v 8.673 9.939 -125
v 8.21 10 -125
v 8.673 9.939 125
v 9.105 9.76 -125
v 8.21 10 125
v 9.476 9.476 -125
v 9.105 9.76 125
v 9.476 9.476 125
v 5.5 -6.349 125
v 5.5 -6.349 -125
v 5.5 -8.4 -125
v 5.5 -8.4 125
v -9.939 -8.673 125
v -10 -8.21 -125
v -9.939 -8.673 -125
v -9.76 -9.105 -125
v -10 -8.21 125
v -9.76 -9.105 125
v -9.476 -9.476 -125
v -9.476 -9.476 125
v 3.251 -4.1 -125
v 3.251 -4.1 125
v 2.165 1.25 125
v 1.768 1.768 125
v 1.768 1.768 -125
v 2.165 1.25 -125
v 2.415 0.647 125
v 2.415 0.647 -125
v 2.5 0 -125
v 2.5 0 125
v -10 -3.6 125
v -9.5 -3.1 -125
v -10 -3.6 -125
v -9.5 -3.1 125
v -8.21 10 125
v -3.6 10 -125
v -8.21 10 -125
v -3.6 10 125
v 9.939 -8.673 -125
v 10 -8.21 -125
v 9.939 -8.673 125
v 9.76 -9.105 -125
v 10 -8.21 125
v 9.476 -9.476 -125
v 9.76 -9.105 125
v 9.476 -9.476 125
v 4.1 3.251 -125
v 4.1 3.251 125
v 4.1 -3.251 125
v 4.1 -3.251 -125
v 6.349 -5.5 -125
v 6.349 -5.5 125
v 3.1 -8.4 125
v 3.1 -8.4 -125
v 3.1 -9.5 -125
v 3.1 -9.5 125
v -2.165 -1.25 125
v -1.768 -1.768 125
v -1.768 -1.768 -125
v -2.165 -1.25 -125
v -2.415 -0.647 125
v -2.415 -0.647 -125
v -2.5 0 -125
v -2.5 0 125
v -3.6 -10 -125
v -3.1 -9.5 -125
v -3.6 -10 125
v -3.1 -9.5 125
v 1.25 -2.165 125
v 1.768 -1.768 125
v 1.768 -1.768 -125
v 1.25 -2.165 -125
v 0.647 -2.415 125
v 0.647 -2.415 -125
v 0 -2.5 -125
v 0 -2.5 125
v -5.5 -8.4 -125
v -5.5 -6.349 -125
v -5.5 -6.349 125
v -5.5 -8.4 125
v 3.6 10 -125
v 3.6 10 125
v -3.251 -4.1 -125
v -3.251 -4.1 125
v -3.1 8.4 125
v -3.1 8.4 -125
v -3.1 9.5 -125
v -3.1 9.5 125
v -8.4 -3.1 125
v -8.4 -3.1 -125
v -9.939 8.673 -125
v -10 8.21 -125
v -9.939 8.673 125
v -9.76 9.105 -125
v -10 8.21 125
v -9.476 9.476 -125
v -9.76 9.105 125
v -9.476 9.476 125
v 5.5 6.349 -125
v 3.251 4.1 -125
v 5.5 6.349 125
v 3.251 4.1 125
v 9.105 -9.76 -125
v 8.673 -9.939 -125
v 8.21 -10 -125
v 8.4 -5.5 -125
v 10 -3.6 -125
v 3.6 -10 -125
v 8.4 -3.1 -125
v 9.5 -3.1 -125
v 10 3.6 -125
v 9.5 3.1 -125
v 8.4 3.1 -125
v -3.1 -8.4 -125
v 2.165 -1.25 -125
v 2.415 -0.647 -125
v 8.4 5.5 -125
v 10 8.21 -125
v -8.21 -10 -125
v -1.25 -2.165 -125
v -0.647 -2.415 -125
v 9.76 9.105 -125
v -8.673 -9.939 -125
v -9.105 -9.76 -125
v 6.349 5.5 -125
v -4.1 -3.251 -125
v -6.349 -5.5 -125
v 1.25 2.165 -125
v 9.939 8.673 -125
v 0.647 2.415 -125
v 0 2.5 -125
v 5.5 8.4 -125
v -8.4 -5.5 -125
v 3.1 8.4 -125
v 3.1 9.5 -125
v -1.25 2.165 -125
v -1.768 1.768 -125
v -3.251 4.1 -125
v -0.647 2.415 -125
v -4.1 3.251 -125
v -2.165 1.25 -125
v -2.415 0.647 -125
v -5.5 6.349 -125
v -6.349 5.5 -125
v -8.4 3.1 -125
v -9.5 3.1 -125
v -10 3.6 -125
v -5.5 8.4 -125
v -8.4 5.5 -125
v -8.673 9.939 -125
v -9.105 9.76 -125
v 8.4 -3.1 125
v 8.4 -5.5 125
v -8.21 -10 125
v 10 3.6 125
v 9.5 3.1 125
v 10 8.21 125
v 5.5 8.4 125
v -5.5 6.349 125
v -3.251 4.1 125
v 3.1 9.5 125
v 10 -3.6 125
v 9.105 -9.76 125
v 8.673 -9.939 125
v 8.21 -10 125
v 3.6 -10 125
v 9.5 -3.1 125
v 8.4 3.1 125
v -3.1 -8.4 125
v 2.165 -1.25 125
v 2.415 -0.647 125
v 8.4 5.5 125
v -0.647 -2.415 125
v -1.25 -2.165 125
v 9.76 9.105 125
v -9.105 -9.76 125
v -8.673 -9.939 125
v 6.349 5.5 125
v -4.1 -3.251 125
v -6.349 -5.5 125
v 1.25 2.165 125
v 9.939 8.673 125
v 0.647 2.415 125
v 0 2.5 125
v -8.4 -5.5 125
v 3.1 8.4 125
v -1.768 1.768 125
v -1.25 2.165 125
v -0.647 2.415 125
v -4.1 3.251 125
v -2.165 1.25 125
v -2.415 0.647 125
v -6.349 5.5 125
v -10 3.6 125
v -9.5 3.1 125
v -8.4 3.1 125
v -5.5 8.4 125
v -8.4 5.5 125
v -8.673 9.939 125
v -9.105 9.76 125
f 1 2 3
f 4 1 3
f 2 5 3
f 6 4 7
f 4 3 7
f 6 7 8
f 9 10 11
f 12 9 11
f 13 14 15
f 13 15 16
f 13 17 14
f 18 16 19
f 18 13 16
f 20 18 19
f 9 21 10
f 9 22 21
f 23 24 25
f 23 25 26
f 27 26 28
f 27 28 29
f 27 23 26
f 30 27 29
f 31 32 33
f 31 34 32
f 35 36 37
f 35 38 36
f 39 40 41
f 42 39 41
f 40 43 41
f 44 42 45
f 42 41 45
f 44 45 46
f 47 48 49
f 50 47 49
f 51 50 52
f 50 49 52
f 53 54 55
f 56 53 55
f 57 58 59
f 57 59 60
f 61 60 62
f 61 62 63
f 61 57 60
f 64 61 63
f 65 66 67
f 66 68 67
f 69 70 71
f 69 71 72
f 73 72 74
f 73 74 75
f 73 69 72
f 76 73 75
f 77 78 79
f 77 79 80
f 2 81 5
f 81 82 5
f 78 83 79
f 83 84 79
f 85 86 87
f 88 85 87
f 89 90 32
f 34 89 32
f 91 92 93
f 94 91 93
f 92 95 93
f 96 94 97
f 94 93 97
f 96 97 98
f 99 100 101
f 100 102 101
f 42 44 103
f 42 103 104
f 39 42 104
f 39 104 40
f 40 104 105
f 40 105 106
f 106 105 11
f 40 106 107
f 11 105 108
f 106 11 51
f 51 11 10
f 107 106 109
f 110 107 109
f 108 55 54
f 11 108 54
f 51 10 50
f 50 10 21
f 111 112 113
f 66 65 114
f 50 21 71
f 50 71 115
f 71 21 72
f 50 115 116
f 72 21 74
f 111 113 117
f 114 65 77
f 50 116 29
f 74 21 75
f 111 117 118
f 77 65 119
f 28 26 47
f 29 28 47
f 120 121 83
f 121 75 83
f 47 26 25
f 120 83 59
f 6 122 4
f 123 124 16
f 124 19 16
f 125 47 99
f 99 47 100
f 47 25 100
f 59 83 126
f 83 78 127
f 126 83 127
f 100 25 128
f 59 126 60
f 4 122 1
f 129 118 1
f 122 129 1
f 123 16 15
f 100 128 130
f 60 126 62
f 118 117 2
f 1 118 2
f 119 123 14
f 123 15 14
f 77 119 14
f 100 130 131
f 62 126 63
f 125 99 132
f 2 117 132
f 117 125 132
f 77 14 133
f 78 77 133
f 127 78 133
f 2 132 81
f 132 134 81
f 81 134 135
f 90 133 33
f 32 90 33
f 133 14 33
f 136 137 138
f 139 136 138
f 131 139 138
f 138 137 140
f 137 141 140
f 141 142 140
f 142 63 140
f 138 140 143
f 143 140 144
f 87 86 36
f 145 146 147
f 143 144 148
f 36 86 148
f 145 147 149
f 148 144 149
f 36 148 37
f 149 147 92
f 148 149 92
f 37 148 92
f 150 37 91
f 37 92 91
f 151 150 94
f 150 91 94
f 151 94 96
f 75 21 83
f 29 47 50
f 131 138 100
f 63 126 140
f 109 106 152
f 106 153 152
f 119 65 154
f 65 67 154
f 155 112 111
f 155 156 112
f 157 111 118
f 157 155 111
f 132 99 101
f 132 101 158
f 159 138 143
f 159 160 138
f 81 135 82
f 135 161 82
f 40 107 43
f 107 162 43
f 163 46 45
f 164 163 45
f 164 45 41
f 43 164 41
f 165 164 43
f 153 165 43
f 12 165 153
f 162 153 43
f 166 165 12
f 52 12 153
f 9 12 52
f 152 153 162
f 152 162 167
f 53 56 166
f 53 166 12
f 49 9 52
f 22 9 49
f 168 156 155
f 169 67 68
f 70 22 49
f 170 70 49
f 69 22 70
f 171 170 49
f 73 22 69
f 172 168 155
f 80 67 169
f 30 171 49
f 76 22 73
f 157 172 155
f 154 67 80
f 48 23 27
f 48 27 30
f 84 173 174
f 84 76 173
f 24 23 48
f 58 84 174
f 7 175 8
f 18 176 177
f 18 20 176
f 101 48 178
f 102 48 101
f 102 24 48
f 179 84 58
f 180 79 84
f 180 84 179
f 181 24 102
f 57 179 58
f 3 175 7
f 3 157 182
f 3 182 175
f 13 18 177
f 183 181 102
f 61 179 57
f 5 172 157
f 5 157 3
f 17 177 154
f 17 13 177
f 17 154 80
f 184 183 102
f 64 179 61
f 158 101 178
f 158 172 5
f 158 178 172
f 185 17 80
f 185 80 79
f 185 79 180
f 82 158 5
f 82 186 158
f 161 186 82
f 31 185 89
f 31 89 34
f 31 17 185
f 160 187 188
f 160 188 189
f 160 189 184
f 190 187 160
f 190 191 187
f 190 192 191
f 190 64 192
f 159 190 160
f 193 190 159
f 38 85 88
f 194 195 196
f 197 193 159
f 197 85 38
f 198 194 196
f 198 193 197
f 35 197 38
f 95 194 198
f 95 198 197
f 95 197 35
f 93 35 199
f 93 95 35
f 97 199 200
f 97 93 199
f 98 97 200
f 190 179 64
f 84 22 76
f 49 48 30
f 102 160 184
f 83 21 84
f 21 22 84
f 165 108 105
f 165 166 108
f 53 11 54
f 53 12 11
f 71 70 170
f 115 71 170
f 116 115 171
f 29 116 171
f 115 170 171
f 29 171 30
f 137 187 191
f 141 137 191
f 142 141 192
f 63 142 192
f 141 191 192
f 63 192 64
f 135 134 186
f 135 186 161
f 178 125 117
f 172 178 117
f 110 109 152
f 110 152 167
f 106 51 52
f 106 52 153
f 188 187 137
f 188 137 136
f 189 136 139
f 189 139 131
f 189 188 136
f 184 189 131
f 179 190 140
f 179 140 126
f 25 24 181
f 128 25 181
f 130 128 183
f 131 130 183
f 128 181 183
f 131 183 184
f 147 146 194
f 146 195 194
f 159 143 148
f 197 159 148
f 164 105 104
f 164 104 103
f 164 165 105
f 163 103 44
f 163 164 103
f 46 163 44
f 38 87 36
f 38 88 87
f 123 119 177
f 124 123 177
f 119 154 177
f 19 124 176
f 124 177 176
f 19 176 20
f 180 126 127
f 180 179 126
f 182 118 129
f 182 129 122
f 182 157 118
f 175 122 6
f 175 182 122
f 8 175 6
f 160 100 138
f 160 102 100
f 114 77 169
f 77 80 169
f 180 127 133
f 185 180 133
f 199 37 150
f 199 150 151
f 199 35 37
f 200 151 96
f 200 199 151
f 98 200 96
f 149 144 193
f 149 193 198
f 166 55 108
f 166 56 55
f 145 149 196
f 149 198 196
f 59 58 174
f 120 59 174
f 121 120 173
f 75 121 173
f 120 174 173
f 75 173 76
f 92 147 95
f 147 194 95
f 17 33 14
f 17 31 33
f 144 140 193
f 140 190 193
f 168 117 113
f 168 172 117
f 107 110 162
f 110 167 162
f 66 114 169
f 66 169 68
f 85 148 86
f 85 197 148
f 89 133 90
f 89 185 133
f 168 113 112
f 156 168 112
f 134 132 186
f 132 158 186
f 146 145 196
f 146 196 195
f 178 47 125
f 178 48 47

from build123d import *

# Parameters (mm, degrees)
BOSS_EXTRUDE1_DEPTH = 125


with BuildPart() as part:
    # Sketch1 → Boss-Extrude1 (new, symmetric)
    with BuildSketch(Plane.XY):
        with BuildLine():
            Line((0, 4.1), (3.251471863, 4.1))
            Line((3.251471863, 4.1), (5.5, 6.348528137))
            Line((5.5, 6.348528137), (5.5, 8.4))
            Line((5.5, 8.4), (3.1, 8.4))
            Line((3.1, 8.4), (3.1, 9.5))
            Line((3.1, 9.5), (3.6, 10))
            Line((3.6, 10), (8.209994734, 10))
            ThreePointArc((8.209994734, 10), (8.895000093, 9.863743962), (9.475719596, 9.475719596))
            Line((9.475719596, 9.475719596), (1.767766953, 1.767766953))
            ThreePointArc((1.767766953, 1.767766953), (0.956708581, 2.309698831), (0, 2.5))
            Line((0, 2.5), (0, 4.1))
        make_face()
    extrude(amount=BOSS_EXTRUDE1_DEPTH, both=True)

    # Mirror1: part across plane


with BuildPart() as part_1:
    add(part.part)
    add(part.part.mirror(Plane(origin=(1.767766953, 1.767766953, 125), x_dir=(0, 0, 1), z_dir=(-0.7071067811865499, 0.7071067811865451, 0))))

    # Mirror2: part across plane


with BuildPart() as part_2:
    add(part_1.part)
    add(part_1.part.mirror(Plane(origin=(0, 4.1, 125), x_dir=(0, 0, 1), z_dir=(1, 0, 0))))

    # Mirror3: part across plane


with BuildPart() as part_3:
    add(part_2.part)
    add(part_2.part.mirror(Plane(origin=(-4.1, 0, 125), x_dir=(0, 0, 1), z_dir=(0, 1, 0))))


solid = part_3.part
